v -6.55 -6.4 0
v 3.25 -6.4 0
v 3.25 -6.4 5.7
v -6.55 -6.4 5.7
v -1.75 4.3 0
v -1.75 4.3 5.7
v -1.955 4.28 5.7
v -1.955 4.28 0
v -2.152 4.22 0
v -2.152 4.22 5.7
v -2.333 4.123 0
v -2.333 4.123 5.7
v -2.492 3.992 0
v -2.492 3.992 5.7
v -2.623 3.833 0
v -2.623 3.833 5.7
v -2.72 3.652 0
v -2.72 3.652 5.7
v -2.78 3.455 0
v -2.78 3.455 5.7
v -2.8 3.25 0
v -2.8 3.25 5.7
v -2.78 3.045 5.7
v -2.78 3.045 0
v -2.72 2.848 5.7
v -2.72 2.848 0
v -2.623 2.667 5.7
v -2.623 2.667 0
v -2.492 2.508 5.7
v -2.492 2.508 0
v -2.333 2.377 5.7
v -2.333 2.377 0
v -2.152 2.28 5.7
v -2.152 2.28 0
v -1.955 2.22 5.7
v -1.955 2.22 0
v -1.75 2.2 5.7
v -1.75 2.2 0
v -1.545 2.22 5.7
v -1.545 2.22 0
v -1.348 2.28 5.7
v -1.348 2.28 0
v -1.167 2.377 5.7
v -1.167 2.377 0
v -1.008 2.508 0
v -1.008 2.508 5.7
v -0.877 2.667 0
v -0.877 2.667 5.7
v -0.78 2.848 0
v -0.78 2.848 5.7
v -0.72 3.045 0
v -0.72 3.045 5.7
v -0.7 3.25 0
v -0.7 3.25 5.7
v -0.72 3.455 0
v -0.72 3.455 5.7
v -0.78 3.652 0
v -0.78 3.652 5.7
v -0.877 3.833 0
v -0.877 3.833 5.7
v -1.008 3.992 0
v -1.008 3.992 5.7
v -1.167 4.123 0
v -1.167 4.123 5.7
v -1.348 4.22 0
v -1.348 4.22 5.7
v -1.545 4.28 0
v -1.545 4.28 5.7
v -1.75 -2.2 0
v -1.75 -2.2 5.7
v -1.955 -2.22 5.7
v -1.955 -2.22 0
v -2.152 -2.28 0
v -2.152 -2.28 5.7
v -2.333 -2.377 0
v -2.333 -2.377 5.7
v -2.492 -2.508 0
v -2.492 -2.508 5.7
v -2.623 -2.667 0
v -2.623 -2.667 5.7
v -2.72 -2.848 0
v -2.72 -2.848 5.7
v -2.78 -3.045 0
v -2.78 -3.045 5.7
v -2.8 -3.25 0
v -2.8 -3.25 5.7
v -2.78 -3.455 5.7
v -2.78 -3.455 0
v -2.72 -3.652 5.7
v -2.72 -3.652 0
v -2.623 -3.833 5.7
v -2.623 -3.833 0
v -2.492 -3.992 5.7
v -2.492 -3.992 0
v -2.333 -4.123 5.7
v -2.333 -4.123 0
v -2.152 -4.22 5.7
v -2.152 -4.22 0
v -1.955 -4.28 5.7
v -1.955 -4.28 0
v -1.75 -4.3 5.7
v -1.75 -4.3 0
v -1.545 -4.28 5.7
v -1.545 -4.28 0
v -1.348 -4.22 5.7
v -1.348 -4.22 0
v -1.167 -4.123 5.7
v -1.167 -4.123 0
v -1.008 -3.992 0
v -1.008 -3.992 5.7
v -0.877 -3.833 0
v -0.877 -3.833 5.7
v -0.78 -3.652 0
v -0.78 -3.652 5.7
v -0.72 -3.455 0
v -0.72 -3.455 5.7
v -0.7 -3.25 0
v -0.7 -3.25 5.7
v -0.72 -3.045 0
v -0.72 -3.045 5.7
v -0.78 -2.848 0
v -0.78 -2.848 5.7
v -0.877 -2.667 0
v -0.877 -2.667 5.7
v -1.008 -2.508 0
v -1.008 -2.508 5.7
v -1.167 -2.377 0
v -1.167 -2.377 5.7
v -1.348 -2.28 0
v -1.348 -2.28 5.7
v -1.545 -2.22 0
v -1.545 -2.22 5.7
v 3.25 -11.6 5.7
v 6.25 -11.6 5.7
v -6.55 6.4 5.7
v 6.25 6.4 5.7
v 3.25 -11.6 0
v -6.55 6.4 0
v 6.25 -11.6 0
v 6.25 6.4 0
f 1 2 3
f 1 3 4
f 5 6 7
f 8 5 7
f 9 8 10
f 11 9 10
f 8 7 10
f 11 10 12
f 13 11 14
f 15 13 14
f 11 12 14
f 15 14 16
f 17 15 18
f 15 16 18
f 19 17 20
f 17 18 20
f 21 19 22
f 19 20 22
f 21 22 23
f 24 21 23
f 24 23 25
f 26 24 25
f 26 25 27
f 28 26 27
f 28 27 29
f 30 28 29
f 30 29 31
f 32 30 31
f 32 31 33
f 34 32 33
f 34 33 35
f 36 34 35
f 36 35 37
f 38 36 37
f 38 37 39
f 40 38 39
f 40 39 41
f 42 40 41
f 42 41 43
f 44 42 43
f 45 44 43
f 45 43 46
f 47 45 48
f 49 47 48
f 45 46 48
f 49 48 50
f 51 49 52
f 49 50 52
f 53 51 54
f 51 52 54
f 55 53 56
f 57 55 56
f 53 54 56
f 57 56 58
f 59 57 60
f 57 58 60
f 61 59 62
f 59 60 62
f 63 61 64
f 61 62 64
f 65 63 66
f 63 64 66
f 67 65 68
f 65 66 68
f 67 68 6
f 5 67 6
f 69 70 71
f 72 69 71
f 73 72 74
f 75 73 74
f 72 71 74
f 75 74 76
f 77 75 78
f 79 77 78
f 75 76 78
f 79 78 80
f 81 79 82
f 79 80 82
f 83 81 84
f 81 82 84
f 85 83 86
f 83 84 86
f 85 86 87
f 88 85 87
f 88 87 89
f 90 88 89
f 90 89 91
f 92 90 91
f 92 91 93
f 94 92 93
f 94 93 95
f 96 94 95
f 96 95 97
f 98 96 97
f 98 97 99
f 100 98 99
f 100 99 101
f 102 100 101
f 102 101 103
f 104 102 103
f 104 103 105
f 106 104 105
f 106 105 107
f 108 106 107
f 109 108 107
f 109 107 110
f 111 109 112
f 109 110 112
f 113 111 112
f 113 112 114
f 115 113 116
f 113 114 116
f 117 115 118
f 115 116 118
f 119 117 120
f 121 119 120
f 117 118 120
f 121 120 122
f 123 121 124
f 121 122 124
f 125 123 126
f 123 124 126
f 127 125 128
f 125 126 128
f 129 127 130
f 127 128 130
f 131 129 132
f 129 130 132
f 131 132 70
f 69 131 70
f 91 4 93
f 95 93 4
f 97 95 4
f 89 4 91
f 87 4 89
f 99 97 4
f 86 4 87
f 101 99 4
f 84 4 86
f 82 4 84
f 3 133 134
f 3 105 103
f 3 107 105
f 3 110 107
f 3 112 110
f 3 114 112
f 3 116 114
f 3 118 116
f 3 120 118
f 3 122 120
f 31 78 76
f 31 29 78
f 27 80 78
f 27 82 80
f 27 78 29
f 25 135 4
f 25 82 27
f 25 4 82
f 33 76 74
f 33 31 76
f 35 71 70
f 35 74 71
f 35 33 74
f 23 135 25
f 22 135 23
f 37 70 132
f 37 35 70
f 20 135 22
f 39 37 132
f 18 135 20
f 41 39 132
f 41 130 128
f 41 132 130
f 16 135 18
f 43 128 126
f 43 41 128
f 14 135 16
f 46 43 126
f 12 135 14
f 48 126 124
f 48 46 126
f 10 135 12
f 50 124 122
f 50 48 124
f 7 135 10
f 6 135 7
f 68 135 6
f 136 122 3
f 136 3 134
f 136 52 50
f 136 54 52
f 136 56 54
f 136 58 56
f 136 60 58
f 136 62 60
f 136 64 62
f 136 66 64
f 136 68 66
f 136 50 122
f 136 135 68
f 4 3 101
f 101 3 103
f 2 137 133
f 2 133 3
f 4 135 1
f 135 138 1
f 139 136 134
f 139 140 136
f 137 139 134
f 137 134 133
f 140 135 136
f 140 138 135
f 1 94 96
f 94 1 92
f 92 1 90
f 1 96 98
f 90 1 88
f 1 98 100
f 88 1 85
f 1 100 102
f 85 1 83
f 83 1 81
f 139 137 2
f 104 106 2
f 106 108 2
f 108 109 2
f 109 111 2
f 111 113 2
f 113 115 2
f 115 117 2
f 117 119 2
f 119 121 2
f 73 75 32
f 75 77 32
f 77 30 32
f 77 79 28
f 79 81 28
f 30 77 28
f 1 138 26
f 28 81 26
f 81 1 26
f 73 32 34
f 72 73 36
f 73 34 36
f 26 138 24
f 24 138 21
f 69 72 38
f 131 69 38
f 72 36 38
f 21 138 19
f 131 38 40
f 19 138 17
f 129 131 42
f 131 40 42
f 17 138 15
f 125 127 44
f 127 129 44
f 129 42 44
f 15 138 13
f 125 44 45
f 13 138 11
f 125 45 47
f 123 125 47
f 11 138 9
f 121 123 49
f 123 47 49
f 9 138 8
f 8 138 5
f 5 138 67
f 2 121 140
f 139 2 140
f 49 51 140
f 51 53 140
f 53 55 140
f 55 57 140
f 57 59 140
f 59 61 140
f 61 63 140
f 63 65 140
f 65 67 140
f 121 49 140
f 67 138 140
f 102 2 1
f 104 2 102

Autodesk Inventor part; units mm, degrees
ref_plane "YZ Plane" through (0, 0, 0) normal (1, 0, 0) x (0, 1, 0)
ref_plane "XZ Plane" through (0, 0, 0) normal (0, 1, 0) x (-1, 0, 0)
ref_plane "XY Plane" through (0, 0, 0) normal (0, 0, 1) x (1, 0, 0)
sketch "Sketch1" plane through (0, 0, 0) normal (0, 0, 1) x (1, 0, 0)
  line L0 (-3.25, 6.4) -> (3.25, 6.4)
  line L1 (3.25, 6.4) -> (3.25, -6.4)
  line L2 (3.25, -6.4) -> (-3.25, -6.4)
  line L3 (-3.25, -6.4) -> (-3.25, 6.4)
  line L4 (-3.25, 6.4) -> (3.25, -6.4) construction
  line L5 (3.25, 6.4) -> (-3.25, -6.4) construction
  line L6 (3.25, -6.4) -> (3.25, 6.4)
  line L7 (3.25, 6.4) -> (6.25, 6.4)
  line L8 (6.25, 6.4) -> (6.25, -11.6)
  line L9 (6.25, -11.6) -> (3.25, -11.6)
  line L10 (3.25, -11.6) -> (3.25, 6.4)
  line L11 (-3.25, 6.4) -> (-6.55, 6.4)
  line L12 (-6.55, 6.4) -> (-6.55, -6.4)
  line L13 (-6.55, -6.4) -> (-3.25, -6.4)
  line L14 (-3.25, -6.4) -> (-3.25, 6.4)
  line L15 (3.25, 0) -> (-3.25, 0) construction
  point P0 (0, 0)
  point P1 (-1.75, -3.25)
  point P2 (-1.75, 3.25)
  dimension "d0" = 6.5
  dimension "d5" = 12.8
  dimension "d6" = 18
  dimension "d7" = 9.5
  dimension "d8" = 3.3
  dimension "d13" = 6.5
  dimension "d14" = 1.5
extrude "Extrusion1" add sketch "Sketch1" along normal blind 5.7
hole "Hole1" at (-1.75, -3.25, 0) at (-1.75, 3.25, 0) direction (0, 0, 1) diameter 2.1 end through all
properties part number "Endstop"
